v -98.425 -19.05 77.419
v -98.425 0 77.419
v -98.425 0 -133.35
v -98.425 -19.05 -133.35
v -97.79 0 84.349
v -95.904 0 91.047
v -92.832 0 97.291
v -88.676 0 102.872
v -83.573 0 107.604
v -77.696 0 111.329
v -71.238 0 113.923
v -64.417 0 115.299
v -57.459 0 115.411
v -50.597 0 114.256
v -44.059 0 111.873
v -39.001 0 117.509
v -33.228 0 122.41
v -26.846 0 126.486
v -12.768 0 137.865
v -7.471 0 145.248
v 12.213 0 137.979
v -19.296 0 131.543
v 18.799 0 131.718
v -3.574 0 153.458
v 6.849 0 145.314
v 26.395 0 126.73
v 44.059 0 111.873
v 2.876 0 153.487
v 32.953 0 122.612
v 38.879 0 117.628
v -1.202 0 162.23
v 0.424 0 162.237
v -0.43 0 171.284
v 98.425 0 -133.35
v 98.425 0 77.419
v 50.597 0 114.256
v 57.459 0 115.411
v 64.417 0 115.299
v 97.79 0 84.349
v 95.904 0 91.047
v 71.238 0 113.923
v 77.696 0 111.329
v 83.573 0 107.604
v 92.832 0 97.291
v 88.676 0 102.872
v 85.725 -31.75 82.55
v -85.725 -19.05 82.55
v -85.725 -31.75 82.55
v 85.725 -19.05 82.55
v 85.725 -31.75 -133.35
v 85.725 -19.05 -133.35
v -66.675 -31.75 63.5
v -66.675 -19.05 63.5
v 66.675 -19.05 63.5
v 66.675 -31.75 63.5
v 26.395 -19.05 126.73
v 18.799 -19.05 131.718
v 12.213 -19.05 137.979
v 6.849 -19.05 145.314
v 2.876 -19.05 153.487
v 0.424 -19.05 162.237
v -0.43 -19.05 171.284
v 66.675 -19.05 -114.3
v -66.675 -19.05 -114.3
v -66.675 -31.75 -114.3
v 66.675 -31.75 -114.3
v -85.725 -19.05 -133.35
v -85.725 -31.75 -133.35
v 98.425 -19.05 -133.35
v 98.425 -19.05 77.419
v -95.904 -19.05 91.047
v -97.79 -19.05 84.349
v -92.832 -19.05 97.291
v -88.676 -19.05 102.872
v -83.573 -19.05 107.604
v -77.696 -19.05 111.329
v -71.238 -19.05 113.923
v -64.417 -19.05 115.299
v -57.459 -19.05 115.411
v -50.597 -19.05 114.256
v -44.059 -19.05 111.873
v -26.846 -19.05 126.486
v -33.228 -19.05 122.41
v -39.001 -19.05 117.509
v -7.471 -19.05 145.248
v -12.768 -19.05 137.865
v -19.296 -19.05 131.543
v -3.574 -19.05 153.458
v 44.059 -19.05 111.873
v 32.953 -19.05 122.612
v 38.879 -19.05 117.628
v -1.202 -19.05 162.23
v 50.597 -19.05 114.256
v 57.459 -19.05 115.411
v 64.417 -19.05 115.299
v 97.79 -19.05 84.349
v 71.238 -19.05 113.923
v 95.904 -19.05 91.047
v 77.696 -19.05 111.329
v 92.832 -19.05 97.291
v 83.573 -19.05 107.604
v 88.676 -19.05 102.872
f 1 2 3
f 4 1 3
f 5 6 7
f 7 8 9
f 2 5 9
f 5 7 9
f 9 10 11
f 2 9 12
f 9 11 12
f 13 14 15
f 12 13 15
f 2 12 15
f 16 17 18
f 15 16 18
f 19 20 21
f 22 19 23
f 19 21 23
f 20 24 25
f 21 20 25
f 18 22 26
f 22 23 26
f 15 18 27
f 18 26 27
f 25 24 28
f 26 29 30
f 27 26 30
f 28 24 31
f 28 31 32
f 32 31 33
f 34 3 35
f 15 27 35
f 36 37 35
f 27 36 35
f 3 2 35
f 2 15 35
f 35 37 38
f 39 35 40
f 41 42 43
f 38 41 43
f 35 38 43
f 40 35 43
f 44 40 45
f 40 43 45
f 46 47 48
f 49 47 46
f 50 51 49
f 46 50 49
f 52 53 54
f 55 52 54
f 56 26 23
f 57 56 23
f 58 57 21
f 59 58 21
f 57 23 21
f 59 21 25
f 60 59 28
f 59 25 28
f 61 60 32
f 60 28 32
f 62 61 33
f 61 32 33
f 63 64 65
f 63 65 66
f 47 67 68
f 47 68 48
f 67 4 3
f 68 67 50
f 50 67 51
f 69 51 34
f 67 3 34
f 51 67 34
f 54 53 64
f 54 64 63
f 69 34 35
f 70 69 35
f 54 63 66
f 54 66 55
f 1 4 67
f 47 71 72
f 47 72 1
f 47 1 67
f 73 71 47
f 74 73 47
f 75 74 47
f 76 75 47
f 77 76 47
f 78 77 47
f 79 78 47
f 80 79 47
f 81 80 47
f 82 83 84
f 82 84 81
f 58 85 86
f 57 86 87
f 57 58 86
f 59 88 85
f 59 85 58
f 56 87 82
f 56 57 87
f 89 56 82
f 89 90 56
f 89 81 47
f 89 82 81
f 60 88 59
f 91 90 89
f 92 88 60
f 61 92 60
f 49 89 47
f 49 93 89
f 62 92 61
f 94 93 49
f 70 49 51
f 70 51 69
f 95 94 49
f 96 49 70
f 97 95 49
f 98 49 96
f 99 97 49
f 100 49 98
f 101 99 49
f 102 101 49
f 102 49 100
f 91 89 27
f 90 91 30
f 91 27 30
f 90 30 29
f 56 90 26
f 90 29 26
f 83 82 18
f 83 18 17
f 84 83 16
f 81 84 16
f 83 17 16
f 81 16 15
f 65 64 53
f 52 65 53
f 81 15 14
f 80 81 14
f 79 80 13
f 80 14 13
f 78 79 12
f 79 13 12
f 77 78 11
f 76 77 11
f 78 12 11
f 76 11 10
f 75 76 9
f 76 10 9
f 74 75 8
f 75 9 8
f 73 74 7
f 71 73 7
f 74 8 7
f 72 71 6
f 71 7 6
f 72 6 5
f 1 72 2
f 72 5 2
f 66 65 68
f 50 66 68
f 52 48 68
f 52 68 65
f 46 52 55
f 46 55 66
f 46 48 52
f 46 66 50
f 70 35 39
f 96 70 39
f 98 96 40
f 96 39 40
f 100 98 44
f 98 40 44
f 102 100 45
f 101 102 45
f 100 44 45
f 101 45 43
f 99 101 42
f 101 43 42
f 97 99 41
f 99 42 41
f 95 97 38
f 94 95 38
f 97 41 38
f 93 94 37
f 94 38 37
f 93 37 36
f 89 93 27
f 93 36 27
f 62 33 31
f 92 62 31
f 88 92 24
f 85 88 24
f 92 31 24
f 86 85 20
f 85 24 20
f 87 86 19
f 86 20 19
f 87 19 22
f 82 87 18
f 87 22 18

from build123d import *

# Parameters (mm, degrees)
F1_DEPTH = 19.05
F2_W     = 171.45
F2_H     = 215.9
F2_W_2   = 133.35
F2_H_2   = 177.8
F3_DEPTH = 12.7


with BuildPart() as f1:
    # F0 (on Front) → F1 (new body)
    with BuildSketch(Plane.XZ):
        with BuildLine():
            Line((-98.425, -133.35), (98.425, -133.35))
            Line((98.425, -133.35), (98.425, 77.419169))
            ThreePointArc((98.425, 77.419169), (80.719687, 109.600946), (44.059291, 111.872568))
            ThreePointArc((44.059291, 111.872568), (36.002014, 120.222357), (26.395227, 126.729917))
            ThreePointArc((26.395227, 126.729917), (6.848586, 145.313951), (-0.430385, 171.284205))
            ThreePointArc((-0.430385, 171.284205), (-7.4709, 145.248294), (-26.846302, 126.485796))
            ThreePointArc((-26.846302, 126.485796), (-36.197892, 120.056834), (-44.059291, 111.872568))
            ThreePointArc((-44.059291, 111.872568), (-80.719687, 109.600946), (-98.425, 77.419169))
            Line((-98.425, 77.419169), (-98.425, -133.35))
        make_face()
    extrude(amount=F1_DEPTH)

    # F2 (on face) → F3 (join)
    with BuildSketch(Plane.XZ.offset(19.05)):
        with Locations((0, -25.4)):
            Rectangle(F2_W, F2_H)
        with Locations((0, -25.4)):
            Rectangle(F2_W_2, F2_H_2, mode=Mode.SUBTRACT)
    extrude(amount=F3_DEPTH)


solid = f1.part
